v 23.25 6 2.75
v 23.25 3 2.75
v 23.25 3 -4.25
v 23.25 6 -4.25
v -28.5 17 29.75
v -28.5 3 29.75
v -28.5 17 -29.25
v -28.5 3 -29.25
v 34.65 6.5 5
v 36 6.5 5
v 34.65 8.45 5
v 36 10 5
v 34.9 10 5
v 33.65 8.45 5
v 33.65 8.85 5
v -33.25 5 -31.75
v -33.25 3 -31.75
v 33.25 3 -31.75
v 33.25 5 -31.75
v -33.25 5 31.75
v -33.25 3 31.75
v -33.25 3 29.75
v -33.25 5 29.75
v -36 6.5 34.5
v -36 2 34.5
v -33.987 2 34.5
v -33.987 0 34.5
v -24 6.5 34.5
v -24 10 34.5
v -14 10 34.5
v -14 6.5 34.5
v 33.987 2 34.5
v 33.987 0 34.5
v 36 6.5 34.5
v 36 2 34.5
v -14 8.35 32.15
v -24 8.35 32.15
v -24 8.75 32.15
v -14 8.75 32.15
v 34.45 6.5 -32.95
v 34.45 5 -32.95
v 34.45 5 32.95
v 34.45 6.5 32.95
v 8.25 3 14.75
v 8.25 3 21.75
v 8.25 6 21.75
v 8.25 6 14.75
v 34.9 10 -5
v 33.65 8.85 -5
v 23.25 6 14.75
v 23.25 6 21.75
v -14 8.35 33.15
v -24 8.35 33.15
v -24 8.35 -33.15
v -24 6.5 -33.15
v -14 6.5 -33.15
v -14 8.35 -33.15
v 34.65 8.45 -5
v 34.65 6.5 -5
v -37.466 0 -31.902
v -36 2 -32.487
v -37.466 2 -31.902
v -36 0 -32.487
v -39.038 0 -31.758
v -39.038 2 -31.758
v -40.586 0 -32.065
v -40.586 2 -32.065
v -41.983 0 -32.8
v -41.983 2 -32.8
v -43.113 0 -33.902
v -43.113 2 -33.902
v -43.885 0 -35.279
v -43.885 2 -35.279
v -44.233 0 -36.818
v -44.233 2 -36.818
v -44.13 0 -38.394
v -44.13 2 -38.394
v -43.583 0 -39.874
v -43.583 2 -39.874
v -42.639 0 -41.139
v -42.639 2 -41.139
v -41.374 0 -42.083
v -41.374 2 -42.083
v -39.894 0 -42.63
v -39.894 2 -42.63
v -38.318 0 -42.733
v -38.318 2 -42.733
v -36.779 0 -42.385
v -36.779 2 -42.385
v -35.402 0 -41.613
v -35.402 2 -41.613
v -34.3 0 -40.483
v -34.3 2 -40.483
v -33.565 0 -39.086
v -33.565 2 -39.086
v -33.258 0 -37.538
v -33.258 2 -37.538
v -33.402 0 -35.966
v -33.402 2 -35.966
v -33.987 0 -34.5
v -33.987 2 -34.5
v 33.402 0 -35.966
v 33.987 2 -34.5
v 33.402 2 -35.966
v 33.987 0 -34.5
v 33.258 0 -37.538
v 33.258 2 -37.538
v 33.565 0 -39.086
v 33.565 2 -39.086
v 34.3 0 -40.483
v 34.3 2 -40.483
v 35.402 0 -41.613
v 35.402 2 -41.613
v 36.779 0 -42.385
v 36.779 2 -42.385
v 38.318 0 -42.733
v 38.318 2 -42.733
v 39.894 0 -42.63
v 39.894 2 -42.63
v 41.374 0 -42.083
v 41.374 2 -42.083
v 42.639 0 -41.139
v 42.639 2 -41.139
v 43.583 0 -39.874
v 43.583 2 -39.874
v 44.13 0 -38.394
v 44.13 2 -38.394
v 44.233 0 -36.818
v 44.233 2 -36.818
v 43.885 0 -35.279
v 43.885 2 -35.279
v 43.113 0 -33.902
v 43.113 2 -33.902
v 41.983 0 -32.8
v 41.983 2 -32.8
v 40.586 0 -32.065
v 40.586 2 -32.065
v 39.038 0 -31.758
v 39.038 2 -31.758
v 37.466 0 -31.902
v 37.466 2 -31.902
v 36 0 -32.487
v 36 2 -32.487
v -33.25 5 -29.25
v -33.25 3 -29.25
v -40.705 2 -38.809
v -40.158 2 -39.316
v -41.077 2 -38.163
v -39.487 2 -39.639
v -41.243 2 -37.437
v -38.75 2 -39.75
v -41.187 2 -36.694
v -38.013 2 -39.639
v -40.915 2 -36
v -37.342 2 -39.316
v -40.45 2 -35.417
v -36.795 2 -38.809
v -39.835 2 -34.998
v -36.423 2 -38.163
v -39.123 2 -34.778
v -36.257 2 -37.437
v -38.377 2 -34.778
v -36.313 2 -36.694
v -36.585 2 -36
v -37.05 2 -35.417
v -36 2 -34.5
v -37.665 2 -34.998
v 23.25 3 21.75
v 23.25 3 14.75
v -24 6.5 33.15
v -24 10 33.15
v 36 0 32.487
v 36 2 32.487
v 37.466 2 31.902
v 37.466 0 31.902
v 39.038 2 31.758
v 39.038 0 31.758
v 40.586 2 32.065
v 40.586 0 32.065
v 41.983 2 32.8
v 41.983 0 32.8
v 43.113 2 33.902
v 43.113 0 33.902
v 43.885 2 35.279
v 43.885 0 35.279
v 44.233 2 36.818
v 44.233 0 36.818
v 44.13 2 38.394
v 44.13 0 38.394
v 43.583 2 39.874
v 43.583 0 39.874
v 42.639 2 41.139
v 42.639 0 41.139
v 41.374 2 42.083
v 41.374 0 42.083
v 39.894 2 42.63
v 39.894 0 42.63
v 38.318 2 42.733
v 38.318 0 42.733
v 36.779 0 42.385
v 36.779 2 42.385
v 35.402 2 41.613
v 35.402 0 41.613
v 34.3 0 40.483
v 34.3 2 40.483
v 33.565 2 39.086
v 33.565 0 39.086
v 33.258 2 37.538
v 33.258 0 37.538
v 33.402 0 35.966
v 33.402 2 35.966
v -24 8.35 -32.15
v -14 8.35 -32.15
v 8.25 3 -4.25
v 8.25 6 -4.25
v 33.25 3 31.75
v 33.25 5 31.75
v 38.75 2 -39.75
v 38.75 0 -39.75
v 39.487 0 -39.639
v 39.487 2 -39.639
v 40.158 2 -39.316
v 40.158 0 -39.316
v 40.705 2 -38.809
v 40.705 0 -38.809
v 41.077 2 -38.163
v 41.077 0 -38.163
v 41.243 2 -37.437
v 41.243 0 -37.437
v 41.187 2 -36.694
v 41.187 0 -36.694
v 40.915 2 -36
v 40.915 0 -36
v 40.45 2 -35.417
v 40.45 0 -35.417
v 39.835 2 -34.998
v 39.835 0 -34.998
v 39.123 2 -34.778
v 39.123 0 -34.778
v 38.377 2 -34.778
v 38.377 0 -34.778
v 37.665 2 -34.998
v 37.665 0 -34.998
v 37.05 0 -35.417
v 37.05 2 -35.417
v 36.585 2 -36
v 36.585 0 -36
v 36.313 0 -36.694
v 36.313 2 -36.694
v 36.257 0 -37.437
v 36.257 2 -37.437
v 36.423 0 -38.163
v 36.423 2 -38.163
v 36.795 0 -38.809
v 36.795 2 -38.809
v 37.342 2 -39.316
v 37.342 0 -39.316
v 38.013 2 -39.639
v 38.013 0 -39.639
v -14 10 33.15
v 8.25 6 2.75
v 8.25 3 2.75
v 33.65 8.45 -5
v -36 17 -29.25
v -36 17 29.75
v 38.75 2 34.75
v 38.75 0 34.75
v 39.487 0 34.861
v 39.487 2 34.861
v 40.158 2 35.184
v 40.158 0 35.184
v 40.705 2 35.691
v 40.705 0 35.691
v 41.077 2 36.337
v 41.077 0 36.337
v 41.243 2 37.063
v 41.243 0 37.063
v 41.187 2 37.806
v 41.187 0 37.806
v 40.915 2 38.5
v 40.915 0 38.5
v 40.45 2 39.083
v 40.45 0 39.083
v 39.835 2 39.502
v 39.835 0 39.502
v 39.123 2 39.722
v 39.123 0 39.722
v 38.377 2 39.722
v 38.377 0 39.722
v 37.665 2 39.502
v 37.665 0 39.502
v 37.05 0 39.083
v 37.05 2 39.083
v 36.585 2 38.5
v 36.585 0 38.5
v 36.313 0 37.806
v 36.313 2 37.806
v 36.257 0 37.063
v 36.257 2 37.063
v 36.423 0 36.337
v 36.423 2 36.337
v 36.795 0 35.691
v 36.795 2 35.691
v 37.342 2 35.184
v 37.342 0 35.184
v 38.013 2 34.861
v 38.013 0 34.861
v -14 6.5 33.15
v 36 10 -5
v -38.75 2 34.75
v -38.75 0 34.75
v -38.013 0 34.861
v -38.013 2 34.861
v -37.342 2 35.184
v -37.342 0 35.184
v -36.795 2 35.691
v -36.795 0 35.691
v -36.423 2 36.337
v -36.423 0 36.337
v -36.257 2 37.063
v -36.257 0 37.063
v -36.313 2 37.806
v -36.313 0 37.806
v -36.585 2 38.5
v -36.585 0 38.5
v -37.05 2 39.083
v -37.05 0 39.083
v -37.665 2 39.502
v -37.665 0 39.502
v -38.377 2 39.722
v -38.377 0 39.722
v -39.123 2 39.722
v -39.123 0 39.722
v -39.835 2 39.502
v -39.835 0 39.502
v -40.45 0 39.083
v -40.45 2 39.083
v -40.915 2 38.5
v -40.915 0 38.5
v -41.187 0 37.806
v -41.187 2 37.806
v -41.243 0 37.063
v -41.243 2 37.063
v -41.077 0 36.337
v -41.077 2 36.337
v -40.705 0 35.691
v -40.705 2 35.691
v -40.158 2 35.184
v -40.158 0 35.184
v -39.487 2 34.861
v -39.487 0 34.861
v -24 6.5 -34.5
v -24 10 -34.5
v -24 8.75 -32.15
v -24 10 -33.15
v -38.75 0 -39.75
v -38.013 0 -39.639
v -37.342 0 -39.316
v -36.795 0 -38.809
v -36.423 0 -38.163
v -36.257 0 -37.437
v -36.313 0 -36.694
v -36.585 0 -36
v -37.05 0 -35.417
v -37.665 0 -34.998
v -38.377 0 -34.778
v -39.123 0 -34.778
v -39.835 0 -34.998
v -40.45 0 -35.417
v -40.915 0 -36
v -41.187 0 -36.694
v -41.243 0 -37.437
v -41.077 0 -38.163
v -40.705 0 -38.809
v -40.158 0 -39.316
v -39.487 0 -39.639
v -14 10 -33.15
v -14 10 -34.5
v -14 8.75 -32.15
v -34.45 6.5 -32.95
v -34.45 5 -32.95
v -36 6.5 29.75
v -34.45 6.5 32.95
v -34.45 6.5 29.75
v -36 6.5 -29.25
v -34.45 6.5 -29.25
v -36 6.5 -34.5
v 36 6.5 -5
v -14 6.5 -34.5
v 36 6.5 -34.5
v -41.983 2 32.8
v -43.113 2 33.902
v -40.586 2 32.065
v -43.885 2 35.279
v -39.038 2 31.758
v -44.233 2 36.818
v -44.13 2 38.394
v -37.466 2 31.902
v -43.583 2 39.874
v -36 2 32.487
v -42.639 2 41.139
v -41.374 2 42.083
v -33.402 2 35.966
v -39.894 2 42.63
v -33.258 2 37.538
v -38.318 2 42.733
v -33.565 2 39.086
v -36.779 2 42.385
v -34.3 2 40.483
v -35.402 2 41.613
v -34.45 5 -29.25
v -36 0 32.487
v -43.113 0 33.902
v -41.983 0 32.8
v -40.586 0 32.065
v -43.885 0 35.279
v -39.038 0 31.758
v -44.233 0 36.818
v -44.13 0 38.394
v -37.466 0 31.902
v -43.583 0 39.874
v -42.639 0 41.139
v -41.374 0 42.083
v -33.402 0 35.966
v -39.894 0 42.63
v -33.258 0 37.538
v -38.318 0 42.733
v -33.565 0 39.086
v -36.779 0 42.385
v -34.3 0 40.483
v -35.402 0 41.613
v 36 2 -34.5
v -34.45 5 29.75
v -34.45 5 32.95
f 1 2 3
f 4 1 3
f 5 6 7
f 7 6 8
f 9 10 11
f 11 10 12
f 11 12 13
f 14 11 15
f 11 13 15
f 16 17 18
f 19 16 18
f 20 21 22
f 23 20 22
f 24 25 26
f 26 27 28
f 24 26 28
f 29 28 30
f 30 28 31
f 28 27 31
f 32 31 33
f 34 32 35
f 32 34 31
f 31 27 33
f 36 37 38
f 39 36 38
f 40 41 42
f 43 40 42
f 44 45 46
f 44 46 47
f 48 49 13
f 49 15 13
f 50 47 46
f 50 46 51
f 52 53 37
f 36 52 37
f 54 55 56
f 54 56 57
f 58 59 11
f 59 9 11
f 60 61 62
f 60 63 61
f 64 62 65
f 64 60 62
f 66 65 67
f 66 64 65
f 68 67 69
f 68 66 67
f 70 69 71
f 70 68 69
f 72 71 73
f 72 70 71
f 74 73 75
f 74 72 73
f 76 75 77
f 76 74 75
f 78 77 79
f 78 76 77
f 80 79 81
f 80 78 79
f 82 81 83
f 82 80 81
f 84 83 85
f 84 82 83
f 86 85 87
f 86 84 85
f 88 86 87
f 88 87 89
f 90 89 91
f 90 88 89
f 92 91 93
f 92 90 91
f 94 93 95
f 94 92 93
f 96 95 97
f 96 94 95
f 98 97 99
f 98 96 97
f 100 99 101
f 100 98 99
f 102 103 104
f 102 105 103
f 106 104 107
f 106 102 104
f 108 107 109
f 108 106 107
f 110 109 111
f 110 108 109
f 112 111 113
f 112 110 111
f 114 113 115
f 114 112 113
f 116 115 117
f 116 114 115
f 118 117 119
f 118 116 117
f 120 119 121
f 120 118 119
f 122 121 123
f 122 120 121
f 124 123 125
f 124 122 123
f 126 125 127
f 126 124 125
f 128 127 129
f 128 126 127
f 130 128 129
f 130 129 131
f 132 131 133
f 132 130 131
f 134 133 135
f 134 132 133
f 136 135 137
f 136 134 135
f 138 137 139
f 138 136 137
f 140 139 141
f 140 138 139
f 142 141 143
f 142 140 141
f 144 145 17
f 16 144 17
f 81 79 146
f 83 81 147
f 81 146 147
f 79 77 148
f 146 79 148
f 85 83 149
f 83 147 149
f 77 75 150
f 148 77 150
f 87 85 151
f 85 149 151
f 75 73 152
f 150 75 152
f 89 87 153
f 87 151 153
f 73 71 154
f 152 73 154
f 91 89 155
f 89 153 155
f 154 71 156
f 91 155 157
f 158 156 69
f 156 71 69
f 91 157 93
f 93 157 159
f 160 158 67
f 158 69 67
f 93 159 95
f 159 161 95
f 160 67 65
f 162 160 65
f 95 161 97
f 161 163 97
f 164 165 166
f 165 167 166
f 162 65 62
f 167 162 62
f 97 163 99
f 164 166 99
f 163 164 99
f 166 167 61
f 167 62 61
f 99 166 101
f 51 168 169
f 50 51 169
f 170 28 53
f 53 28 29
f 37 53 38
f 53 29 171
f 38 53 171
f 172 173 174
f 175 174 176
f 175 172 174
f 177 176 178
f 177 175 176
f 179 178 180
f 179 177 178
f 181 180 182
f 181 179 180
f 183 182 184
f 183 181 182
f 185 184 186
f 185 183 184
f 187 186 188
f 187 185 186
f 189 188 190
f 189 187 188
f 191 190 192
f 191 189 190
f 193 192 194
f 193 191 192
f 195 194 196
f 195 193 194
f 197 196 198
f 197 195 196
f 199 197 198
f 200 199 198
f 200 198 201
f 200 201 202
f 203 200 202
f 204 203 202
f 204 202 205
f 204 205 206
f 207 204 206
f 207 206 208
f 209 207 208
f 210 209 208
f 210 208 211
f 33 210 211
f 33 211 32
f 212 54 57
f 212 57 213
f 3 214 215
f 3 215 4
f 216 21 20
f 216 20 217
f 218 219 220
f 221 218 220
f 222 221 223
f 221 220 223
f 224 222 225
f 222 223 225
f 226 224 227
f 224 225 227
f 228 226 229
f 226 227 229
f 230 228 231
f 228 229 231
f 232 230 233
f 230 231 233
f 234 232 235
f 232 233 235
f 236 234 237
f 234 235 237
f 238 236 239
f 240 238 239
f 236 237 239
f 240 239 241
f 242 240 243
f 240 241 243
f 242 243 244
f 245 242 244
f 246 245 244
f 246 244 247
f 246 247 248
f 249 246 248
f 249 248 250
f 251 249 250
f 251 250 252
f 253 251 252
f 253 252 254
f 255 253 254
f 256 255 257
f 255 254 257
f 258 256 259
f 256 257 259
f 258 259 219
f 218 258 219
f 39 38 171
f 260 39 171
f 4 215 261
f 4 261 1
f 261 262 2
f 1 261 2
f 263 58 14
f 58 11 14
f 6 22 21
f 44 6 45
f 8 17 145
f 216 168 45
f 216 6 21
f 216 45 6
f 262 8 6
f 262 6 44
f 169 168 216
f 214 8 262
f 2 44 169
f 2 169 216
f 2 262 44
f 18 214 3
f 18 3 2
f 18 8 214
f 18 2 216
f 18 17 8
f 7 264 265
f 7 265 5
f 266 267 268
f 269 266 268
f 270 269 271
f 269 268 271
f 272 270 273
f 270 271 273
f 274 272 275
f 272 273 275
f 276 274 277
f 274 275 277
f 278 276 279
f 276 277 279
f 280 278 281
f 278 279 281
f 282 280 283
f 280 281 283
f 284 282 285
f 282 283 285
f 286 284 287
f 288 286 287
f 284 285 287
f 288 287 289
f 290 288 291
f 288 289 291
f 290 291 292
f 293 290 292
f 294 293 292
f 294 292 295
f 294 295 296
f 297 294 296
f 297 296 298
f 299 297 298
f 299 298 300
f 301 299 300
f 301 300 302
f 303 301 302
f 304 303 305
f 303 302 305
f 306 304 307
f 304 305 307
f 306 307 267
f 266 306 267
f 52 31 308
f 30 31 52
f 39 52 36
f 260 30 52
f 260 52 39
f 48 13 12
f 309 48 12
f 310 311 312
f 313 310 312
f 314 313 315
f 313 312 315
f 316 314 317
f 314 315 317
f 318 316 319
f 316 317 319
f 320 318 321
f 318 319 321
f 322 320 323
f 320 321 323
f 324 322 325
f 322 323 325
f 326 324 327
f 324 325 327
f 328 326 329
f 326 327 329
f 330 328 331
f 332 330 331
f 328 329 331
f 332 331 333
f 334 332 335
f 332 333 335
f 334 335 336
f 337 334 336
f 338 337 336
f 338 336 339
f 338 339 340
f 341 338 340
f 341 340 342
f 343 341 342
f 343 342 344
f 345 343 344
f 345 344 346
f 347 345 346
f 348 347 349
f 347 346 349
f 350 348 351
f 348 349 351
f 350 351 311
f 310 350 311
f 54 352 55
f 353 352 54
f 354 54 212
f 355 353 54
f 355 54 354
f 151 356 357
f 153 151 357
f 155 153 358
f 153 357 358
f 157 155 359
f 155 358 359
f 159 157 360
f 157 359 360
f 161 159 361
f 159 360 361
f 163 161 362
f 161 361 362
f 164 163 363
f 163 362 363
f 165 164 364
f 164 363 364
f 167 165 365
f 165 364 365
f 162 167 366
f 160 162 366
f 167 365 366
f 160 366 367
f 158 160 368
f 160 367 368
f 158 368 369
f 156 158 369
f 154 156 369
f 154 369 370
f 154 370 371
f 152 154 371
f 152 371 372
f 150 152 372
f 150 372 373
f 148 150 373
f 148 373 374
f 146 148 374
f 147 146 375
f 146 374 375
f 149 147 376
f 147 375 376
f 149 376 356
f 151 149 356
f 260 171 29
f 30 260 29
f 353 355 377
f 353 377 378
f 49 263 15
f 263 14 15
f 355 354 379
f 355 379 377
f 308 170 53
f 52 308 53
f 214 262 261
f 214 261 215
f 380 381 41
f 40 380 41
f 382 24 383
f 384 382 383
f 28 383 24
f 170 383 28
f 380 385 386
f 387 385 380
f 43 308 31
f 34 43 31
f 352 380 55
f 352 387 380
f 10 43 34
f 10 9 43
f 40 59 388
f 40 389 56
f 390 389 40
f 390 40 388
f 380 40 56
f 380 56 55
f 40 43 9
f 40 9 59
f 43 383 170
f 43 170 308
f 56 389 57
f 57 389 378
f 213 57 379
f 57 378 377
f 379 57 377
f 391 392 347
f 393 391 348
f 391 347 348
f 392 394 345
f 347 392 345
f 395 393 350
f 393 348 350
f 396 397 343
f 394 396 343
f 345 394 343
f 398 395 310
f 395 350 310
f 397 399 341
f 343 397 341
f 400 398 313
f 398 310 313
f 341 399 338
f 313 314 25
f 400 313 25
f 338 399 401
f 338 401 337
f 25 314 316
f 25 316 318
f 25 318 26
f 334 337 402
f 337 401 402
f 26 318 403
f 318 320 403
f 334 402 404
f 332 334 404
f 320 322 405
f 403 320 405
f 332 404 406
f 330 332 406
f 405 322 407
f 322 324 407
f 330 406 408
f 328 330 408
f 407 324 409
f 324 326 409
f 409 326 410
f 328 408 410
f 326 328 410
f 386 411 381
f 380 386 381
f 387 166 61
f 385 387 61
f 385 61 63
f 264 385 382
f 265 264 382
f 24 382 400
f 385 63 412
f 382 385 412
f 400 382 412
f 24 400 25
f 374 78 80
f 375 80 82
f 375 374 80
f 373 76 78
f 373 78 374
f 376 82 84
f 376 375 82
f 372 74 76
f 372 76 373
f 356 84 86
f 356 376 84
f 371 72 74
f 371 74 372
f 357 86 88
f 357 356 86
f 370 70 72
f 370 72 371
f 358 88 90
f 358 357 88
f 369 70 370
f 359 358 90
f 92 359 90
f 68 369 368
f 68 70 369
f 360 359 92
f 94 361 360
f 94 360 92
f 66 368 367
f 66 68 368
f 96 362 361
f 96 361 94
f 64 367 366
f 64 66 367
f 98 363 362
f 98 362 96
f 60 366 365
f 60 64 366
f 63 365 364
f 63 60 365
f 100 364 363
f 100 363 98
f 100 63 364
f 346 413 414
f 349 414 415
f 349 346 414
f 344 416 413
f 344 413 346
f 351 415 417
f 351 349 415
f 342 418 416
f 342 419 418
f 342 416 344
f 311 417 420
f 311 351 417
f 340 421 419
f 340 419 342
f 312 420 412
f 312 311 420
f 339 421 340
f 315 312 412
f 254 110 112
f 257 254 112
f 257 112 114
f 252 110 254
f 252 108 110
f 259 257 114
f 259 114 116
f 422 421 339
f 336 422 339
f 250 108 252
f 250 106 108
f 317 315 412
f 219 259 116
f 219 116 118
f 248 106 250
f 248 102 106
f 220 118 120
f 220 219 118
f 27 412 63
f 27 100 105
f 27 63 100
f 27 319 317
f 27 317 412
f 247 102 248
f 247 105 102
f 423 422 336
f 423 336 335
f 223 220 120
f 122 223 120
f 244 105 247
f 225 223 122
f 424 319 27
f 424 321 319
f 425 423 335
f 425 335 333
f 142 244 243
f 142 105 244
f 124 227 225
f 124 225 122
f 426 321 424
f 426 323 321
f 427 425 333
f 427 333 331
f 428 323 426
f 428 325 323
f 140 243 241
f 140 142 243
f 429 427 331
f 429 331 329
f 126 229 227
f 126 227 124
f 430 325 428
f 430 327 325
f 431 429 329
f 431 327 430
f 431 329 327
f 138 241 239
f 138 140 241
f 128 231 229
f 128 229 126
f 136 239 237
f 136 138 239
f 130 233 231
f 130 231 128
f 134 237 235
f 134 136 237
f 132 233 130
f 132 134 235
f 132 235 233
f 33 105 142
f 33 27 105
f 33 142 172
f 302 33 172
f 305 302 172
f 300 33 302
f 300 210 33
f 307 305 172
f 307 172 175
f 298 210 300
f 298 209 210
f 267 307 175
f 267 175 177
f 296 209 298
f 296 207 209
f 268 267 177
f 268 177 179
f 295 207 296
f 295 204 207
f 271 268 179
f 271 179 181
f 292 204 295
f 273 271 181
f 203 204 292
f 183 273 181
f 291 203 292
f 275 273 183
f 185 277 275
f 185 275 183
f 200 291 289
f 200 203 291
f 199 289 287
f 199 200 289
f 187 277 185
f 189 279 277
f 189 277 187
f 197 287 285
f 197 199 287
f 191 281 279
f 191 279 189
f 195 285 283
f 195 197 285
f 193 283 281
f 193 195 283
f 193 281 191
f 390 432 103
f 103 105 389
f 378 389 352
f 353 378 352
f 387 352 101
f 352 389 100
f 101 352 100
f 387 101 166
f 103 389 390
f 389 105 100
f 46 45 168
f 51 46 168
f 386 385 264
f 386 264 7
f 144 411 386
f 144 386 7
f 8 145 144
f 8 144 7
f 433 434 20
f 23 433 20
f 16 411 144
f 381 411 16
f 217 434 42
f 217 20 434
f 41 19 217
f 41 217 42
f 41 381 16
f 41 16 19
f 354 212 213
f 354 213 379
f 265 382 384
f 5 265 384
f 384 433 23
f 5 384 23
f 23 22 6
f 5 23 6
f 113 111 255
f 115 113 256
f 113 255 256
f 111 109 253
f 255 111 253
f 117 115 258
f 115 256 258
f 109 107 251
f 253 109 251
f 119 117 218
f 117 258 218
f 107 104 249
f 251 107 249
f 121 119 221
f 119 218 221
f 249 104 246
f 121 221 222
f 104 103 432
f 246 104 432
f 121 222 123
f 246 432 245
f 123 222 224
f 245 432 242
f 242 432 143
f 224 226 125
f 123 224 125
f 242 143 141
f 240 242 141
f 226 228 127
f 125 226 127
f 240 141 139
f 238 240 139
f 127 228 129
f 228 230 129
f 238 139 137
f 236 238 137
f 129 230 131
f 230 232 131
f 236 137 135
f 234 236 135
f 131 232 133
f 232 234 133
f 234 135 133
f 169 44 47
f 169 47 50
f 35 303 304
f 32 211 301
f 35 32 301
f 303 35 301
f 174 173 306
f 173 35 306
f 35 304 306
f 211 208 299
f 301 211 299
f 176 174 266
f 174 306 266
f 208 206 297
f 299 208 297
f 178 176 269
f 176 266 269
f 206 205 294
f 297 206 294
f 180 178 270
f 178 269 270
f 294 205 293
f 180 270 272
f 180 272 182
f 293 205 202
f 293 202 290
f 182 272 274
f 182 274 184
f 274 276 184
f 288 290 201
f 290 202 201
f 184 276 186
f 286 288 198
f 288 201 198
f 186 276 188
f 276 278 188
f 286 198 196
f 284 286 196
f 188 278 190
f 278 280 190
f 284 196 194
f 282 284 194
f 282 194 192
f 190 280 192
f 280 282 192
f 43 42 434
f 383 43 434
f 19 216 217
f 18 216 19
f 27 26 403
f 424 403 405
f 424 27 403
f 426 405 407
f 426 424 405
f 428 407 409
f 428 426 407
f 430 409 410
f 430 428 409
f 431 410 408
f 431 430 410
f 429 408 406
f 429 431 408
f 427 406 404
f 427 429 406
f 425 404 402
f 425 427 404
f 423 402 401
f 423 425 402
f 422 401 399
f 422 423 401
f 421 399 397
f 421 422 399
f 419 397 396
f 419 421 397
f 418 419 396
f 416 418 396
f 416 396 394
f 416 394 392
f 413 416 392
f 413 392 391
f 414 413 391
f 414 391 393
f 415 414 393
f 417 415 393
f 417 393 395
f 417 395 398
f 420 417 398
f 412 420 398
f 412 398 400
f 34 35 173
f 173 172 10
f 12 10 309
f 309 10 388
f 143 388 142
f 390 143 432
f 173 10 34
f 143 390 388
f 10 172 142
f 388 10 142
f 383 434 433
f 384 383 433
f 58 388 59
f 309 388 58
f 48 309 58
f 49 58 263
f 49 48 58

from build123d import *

# Parameters (mm, degrees)
SKETCH2_W           = 66.5
SKETCH2_H           = 63.5
BOSS_EXTRUDE1_DEPTH = 3
SKETCH6_W           = 72
SKETCH6_H           = 69
SKETCH6_W_2         = 66.5
SKETCH6_H_2         = 63.5
BOSS_EXTRUDE2_DEPTH = 5
SKETCH14_W          = 7.5
SKETCH14_H          = 59
BOSS_EXTRUDE4_DEPTH = 14
BOSS_EXTRUDE5_DEPTH = 1.5
SKETCH16_R          = 5.5
SKETCH16_R_2        = 2.5
BOSS_EXTRUDE6_DEPTH = 2
BOSS_EXTRUDE7_DEPTH = 10
BOSS_EXTRUDE8_DEPTH = 5
SKETCH19_W          = 15
SKETCH19_H          = 7
BOSS_EXTRUDE9_DEPTH = 3


with BuildPart() as part:
    # Sketch2 → Boss-Extrude1 (new body)
    with BuildSketch(Plane(origin=(0, 0, 0), x_dir=(1, 0, 0), z_dir=(0, 1, 0))):
        Rectangle(SKETCH2_W, SKETCH2_H)
    extrude(amount=BOSS_EXTRUDE1_DEPTH)

    # Sketch6 → Boss-Extrude2 (add)
    with BuildSketch(Plane(origin=(0, 0, 0), x_dir=(1, 0, 0), z_dir=(0, 1, 0))):
        Rectangle(SKETCH6_W, SKETCH6_H)
        Rectangle(SKETCH6_W_2, SKETCH6_H_2, mode=Mode.SUBTRACT)
    extrude(amount=BOSS_EXTRUDE2_DEPTH)

    # Sketch14 → Boss-Extrude4 (add)
    with BuildSketch(Plane(origin=(0, 3, 0), x_dir=(1, 0, 0), z_dir=(0, 1, 0))):
        with Locations((-32.25, -0.25)):
            Rectangle(SKETCH14_W, SKETCH14_H)
    extrude(amount=BOSS_EXTRUDE4_DEPTH)

    # Sketch15 → Boss-Extrude5 (add)
    with BuildSketch(Plane(origin=(0, 5, 0), x_dir=(1, 0, 0), z_dir=(0, 1, 0))):
        Polygon((-34.45, 32.95), (34.45, 32.95), (34.45, -32.95), (-34.45, -32.95), (-34.45, -29.75), (-36, -29.75), (-36, -34.5), (36, -34.5), (36, 34.5), (-36, 34.5), (-36, 29.25), (-34.45, 29.25), align=None)
    extrude(amount=BOSS_EXTRUDE5_DEPTH)

    # Sketch16 → Boss-Extrude6 (add)
    # profile 1 of 4: a face of its own
    with BuildSketch(Plane.XZ):
        with Locations((-38.75, 37.25)):
            Circle(SKETCH16_R)
        with Locations(Location((-38.75, 37.25, 0), (0, 0, 270))):
            Circle(SKETCH16_R_2, mode=Mode.SUBTRACT)
    # profile 2 of 4: a face of its own
    with BuildSketch(Plane.XZ):
        with Locations((38.75, 37.25)):
            Circle(SKETCH16_R)
        with Locations(Location((38.75, 37.25, 0), (0, 0, 270))):
            Circle(SKETCH16_R_2, mode=Mode.SUBTRACT)
    # profile 3 of 4: a face of its own
    with BuildSketch(Plane.XZ):
        with Locations((38.75, -37.25)):
            Circle(SKETCH16_R)
        with Locations(Location((38.75, -37.25, 0), (0, 0, 270))):
            Circle(SKETCH16_R_2, mode=Mode.SUBTRACT)
    # profile 4 of 4: a face of its own
    with BuildSketch(Plane.XZ):
        with Locations((-38.75, -37.25)):
            Circle(SKETCH16_R)
        with Locations(Location((-38.75, -37.25, 0), (0, 0, 270))):
            Circle(SKETCH16_R_2, mode=Mode.SUBTRACT)
    extrude(amount=-BOSS_EXTRUDE6_DEPTH)

    # Sketch17 → Boss-Extrude7 (add)
    with BuildSketch(Plane.ZY.offset(24)):
        Polygon((34.5, 6.5), (33.15, 6.5), (33.15, 8.35), (32.15, 8.35), (32.15, 8.75), (33.15, 10), (34.5, 10), align=None)
    boss_extrude7 = extrude(amount=-BOSS_EXTRUDE7_DEPTH)

    # Mirror1: Boss-Extrude7 across plane
    add(boss_extrude7.mirror(Plane.XY))

    # Sketch18 → Boss-Extrude8 (add, symmetric)
    with BuildSketch(Plane.XY):
        Polygon((36, 6.5), (34.65, 6.5), (34.65, 8.45), (33.65, 8.45), (33.65, 8.85), (34.90023603, 10), (36, 10), align=None)
    extrude(amount=BOSS_EXTRUDE8_DEPTH, both=True)

    # Sketch19 → Boss-Extrude9 (add)
    with BuildSketch(Plane(origin=(0, 3, 0), x_dir=(1, 0, 0), z_dir=(0, 1, 0))):
        with Locations((15.75, -18.25)):
            Rectangle(SKETCH19_W, SKETCH19_H)
        with Locations((15.75, 0.75)):
            Rectangle(SKETCH19_W, SKETCH19_H)
    extrude(amount=BOSS_EXTRUDE9_DEPTH)


solid = part.part
